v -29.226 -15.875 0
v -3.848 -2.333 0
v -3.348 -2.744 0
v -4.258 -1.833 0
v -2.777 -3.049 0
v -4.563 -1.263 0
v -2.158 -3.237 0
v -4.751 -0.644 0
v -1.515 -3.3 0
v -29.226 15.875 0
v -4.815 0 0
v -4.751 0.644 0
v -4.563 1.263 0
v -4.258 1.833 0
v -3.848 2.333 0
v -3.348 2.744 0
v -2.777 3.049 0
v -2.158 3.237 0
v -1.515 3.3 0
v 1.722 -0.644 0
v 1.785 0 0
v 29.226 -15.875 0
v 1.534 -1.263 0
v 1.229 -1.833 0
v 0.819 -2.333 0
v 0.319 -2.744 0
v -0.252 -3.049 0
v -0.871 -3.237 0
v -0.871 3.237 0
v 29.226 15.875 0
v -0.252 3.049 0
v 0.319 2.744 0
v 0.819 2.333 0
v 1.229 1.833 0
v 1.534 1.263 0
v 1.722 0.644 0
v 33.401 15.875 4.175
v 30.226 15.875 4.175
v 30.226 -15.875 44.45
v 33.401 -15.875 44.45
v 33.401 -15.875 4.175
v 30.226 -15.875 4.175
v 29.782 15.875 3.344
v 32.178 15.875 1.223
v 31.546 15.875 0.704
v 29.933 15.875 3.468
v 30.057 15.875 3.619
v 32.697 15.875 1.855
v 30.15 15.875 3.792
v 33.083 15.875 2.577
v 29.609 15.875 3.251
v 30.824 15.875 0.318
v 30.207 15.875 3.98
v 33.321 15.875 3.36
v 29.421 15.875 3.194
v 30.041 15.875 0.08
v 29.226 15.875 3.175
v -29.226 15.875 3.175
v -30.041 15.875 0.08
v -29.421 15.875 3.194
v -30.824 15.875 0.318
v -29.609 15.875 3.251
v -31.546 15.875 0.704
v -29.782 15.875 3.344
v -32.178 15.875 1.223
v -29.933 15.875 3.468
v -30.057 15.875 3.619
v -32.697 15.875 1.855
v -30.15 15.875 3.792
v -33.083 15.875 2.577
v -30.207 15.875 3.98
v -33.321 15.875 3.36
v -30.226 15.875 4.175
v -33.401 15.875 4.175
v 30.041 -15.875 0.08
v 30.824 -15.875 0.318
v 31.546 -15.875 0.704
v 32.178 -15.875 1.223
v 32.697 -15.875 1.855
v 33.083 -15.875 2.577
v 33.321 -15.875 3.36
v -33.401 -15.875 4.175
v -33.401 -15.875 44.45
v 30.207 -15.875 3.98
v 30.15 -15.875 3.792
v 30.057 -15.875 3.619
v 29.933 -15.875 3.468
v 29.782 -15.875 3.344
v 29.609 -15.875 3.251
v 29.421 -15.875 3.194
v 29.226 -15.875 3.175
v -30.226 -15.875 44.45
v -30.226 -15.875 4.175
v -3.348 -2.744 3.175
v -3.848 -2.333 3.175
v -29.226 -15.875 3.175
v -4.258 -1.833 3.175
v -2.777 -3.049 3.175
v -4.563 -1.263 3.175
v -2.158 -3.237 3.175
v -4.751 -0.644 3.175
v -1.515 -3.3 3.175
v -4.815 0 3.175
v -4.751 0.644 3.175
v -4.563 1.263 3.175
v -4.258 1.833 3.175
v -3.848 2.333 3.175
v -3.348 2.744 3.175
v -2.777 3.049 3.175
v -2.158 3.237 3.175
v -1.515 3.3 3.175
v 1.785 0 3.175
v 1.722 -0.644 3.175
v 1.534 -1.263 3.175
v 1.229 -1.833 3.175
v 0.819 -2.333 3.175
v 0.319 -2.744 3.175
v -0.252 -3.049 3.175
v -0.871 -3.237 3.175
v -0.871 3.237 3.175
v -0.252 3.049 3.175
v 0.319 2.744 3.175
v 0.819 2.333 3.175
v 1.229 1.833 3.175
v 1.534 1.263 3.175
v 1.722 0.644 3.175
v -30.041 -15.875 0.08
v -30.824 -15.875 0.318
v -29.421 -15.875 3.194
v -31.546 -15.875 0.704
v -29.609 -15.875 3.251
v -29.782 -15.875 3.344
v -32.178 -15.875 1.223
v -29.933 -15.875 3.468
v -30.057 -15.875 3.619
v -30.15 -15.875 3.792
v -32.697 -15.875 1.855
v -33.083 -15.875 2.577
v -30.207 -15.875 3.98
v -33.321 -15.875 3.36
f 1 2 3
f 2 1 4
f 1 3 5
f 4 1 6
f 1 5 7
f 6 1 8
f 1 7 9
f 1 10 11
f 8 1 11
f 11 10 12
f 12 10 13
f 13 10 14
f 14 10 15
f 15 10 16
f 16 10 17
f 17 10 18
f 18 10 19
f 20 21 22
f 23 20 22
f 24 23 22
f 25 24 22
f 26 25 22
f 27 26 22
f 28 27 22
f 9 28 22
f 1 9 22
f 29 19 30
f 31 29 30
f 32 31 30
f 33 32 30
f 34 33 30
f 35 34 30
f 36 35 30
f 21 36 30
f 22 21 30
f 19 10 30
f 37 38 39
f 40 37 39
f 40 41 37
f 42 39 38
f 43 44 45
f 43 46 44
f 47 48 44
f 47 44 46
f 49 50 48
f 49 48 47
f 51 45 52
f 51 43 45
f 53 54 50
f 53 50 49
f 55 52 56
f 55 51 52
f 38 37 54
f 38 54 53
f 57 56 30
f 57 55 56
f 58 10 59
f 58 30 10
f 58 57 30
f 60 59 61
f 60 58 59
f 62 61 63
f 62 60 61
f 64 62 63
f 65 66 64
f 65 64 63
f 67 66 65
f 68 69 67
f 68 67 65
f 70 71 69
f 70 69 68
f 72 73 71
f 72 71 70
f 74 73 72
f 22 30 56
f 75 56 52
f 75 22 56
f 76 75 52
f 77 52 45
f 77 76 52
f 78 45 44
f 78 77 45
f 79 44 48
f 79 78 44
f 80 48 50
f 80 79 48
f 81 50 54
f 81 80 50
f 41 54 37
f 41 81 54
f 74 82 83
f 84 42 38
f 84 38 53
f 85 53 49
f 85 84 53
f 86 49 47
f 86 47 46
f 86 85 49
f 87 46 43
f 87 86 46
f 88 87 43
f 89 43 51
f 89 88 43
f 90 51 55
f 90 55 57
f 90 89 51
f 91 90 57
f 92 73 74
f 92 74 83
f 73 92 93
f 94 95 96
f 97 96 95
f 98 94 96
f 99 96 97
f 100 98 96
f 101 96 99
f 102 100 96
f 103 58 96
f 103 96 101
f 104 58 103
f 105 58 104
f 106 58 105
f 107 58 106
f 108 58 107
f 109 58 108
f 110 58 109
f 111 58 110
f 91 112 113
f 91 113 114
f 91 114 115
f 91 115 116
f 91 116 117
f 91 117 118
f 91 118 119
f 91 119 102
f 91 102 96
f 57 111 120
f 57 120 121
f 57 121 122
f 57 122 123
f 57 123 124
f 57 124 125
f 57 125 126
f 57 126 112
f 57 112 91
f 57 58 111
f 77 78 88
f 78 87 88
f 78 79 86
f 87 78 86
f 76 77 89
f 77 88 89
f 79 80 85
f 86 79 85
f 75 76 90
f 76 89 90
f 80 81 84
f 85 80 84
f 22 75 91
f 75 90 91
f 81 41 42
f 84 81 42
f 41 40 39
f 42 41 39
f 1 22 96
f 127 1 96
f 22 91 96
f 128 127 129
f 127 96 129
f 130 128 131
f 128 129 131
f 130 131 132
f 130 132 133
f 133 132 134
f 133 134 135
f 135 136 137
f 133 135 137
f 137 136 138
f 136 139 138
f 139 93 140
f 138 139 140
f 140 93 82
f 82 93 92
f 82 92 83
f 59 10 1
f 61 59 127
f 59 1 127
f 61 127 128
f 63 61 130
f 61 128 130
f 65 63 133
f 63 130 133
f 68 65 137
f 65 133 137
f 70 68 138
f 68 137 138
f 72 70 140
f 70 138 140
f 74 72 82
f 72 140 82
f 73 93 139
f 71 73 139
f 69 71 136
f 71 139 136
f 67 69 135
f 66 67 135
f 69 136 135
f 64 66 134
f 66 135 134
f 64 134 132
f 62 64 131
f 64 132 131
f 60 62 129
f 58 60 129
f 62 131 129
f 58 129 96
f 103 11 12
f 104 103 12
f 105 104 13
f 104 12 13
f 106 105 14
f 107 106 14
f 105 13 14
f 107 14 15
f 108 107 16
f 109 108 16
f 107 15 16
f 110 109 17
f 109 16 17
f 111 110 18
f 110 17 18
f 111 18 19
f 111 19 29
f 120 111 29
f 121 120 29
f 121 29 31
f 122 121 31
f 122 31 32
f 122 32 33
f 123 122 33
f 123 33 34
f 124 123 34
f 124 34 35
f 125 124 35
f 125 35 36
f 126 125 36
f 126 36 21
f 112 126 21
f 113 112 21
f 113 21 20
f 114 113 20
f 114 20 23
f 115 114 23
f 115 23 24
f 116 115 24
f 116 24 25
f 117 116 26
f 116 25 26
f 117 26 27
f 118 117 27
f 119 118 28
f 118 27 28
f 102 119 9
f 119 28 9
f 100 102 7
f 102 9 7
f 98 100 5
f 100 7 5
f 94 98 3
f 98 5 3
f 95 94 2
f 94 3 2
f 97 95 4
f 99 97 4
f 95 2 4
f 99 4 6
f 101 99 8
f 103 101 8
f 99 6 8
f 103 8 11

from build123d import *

# Parameters (mm, degrees)
SKETCH2_W                    = 60.452
SKETCH2_H                    = 31.75
BASE_FLANGE1_DEPTH           = 3.175
EDGE_FLANGE1_STRIP_W         = 14.7
EDGE_FLANGE1_STRIP_H         = 3.175
EDGE_FLANGE1_STRIP_CUT_DEPTH = 31.75
EDGE_FLANGE1_DEPTH           = 31.75
CUT_EXTRUDE1_START           = -3.175
CUT_EXTRUDE1_DEPTH           = 83.39755521
M6_CLEARANCE_HOLE1_D         = 6.6


# Sheet-metal steps are written as plain solids
with BuildPart() as part:
    # Sketch2 → Base-Flange1 (new body)
    with BuildSketch(Plane.XY):
        Rectangle(SKETCH2_W, SKETCH2_H)
    extrude(amount=BASE_FLANGE1_DEPTH)

    # Edge-Flange1 strip (across the edge) → Edge-Flange1 strip cut (cut)
    with BuildSketch(Plane(origin=(30.226, -15.875, 3.175), x_dir=(-1, 0, 0), z_dir=(0, 1, 0))):
        with Locations((-6.35, -1.5875)):
            Rectangle(EDGE_FLANGE1_STRIP_W, EDGE_FLANGE1_STRIP_H)
    edge_flange1_strip_cut = extrude(amount=EDGE_FLANGE1_STRIP_CUT_DEPTH, mode=Mode.SUBTRACT)

    # Edge-Flange1 section (across the edge) → Edge-Flange1 (add)
    with BuildSketch(Plane(origin=(30.226, -15.875, 3.175), x_dir=(-1, 0, 0), z_dir=(0, 1, 0))):
        with BuildLine():
            Line((-3.175, 1), (-3.175, 41.275))
            Line((-3.175, 41.275), (0, 41.275))
            Line((0, 41.275), (0, 1))
            ThreePointArc((0, 1), (0.292893219, 0.292893219), (1, 0))
            Line((1, 0), (1, -3.175))
            ThreePointArc((1, -3.175), (-1.952170811, -1.952170811), (-3.175, 1))
        make_face()
    edge_flange1 = extrude(amount=EDGE_FLANGE1_DEPTH)

    # Sketch10 → Cut-Extrude1 (cut)
    with BuildSketch(Plane(origin=(33.401, 0, 0), x_dir=(0, 0, -1), z_dir=(1, 0, 0)).offset(CUT_EXTRUDE1_START)):
        Polygon((-4.175, 15.875), (-44.45, -15.875), (-44.45, 15.875), align=None)
    cut_extrude1 = extrude(amount=CUT_EXTRUDE1_DEPTH, mode=Mode.SUBTRACT)

    # Mirror1: Edge-Flange1 strip cut, Edge-Flange1, Cut-Extrude1 across plane
    add(edge_flange1_strip_cut.mirror(Plane(origin=(0, 0, 0), x_dir=(0, 0, 1), z_dir=(1, 0, 0))), mode=Mode.SUBTRACT)
    add(edge_flange1.mirror(Plane(origin=(0, 0, 0), x_dir=(0, 0, 1), z_dir=(1, 0, 0))))
    add(cut_extrude1.mirror(Plane(origin=(0, 0, 0), x_dir=(0, 0, 1), z_dir=(1, 0, 0))), mode=Mode.SUBTRACT)

    # M6 Clearance Hole1 (through all)
    with Locations(Plane.XY.offset(3.175)):
        with Locations((-1.5146, 0)):
            Hole(M6_CLEARANCE_HOLE1_D / 2)


solid = part.part
